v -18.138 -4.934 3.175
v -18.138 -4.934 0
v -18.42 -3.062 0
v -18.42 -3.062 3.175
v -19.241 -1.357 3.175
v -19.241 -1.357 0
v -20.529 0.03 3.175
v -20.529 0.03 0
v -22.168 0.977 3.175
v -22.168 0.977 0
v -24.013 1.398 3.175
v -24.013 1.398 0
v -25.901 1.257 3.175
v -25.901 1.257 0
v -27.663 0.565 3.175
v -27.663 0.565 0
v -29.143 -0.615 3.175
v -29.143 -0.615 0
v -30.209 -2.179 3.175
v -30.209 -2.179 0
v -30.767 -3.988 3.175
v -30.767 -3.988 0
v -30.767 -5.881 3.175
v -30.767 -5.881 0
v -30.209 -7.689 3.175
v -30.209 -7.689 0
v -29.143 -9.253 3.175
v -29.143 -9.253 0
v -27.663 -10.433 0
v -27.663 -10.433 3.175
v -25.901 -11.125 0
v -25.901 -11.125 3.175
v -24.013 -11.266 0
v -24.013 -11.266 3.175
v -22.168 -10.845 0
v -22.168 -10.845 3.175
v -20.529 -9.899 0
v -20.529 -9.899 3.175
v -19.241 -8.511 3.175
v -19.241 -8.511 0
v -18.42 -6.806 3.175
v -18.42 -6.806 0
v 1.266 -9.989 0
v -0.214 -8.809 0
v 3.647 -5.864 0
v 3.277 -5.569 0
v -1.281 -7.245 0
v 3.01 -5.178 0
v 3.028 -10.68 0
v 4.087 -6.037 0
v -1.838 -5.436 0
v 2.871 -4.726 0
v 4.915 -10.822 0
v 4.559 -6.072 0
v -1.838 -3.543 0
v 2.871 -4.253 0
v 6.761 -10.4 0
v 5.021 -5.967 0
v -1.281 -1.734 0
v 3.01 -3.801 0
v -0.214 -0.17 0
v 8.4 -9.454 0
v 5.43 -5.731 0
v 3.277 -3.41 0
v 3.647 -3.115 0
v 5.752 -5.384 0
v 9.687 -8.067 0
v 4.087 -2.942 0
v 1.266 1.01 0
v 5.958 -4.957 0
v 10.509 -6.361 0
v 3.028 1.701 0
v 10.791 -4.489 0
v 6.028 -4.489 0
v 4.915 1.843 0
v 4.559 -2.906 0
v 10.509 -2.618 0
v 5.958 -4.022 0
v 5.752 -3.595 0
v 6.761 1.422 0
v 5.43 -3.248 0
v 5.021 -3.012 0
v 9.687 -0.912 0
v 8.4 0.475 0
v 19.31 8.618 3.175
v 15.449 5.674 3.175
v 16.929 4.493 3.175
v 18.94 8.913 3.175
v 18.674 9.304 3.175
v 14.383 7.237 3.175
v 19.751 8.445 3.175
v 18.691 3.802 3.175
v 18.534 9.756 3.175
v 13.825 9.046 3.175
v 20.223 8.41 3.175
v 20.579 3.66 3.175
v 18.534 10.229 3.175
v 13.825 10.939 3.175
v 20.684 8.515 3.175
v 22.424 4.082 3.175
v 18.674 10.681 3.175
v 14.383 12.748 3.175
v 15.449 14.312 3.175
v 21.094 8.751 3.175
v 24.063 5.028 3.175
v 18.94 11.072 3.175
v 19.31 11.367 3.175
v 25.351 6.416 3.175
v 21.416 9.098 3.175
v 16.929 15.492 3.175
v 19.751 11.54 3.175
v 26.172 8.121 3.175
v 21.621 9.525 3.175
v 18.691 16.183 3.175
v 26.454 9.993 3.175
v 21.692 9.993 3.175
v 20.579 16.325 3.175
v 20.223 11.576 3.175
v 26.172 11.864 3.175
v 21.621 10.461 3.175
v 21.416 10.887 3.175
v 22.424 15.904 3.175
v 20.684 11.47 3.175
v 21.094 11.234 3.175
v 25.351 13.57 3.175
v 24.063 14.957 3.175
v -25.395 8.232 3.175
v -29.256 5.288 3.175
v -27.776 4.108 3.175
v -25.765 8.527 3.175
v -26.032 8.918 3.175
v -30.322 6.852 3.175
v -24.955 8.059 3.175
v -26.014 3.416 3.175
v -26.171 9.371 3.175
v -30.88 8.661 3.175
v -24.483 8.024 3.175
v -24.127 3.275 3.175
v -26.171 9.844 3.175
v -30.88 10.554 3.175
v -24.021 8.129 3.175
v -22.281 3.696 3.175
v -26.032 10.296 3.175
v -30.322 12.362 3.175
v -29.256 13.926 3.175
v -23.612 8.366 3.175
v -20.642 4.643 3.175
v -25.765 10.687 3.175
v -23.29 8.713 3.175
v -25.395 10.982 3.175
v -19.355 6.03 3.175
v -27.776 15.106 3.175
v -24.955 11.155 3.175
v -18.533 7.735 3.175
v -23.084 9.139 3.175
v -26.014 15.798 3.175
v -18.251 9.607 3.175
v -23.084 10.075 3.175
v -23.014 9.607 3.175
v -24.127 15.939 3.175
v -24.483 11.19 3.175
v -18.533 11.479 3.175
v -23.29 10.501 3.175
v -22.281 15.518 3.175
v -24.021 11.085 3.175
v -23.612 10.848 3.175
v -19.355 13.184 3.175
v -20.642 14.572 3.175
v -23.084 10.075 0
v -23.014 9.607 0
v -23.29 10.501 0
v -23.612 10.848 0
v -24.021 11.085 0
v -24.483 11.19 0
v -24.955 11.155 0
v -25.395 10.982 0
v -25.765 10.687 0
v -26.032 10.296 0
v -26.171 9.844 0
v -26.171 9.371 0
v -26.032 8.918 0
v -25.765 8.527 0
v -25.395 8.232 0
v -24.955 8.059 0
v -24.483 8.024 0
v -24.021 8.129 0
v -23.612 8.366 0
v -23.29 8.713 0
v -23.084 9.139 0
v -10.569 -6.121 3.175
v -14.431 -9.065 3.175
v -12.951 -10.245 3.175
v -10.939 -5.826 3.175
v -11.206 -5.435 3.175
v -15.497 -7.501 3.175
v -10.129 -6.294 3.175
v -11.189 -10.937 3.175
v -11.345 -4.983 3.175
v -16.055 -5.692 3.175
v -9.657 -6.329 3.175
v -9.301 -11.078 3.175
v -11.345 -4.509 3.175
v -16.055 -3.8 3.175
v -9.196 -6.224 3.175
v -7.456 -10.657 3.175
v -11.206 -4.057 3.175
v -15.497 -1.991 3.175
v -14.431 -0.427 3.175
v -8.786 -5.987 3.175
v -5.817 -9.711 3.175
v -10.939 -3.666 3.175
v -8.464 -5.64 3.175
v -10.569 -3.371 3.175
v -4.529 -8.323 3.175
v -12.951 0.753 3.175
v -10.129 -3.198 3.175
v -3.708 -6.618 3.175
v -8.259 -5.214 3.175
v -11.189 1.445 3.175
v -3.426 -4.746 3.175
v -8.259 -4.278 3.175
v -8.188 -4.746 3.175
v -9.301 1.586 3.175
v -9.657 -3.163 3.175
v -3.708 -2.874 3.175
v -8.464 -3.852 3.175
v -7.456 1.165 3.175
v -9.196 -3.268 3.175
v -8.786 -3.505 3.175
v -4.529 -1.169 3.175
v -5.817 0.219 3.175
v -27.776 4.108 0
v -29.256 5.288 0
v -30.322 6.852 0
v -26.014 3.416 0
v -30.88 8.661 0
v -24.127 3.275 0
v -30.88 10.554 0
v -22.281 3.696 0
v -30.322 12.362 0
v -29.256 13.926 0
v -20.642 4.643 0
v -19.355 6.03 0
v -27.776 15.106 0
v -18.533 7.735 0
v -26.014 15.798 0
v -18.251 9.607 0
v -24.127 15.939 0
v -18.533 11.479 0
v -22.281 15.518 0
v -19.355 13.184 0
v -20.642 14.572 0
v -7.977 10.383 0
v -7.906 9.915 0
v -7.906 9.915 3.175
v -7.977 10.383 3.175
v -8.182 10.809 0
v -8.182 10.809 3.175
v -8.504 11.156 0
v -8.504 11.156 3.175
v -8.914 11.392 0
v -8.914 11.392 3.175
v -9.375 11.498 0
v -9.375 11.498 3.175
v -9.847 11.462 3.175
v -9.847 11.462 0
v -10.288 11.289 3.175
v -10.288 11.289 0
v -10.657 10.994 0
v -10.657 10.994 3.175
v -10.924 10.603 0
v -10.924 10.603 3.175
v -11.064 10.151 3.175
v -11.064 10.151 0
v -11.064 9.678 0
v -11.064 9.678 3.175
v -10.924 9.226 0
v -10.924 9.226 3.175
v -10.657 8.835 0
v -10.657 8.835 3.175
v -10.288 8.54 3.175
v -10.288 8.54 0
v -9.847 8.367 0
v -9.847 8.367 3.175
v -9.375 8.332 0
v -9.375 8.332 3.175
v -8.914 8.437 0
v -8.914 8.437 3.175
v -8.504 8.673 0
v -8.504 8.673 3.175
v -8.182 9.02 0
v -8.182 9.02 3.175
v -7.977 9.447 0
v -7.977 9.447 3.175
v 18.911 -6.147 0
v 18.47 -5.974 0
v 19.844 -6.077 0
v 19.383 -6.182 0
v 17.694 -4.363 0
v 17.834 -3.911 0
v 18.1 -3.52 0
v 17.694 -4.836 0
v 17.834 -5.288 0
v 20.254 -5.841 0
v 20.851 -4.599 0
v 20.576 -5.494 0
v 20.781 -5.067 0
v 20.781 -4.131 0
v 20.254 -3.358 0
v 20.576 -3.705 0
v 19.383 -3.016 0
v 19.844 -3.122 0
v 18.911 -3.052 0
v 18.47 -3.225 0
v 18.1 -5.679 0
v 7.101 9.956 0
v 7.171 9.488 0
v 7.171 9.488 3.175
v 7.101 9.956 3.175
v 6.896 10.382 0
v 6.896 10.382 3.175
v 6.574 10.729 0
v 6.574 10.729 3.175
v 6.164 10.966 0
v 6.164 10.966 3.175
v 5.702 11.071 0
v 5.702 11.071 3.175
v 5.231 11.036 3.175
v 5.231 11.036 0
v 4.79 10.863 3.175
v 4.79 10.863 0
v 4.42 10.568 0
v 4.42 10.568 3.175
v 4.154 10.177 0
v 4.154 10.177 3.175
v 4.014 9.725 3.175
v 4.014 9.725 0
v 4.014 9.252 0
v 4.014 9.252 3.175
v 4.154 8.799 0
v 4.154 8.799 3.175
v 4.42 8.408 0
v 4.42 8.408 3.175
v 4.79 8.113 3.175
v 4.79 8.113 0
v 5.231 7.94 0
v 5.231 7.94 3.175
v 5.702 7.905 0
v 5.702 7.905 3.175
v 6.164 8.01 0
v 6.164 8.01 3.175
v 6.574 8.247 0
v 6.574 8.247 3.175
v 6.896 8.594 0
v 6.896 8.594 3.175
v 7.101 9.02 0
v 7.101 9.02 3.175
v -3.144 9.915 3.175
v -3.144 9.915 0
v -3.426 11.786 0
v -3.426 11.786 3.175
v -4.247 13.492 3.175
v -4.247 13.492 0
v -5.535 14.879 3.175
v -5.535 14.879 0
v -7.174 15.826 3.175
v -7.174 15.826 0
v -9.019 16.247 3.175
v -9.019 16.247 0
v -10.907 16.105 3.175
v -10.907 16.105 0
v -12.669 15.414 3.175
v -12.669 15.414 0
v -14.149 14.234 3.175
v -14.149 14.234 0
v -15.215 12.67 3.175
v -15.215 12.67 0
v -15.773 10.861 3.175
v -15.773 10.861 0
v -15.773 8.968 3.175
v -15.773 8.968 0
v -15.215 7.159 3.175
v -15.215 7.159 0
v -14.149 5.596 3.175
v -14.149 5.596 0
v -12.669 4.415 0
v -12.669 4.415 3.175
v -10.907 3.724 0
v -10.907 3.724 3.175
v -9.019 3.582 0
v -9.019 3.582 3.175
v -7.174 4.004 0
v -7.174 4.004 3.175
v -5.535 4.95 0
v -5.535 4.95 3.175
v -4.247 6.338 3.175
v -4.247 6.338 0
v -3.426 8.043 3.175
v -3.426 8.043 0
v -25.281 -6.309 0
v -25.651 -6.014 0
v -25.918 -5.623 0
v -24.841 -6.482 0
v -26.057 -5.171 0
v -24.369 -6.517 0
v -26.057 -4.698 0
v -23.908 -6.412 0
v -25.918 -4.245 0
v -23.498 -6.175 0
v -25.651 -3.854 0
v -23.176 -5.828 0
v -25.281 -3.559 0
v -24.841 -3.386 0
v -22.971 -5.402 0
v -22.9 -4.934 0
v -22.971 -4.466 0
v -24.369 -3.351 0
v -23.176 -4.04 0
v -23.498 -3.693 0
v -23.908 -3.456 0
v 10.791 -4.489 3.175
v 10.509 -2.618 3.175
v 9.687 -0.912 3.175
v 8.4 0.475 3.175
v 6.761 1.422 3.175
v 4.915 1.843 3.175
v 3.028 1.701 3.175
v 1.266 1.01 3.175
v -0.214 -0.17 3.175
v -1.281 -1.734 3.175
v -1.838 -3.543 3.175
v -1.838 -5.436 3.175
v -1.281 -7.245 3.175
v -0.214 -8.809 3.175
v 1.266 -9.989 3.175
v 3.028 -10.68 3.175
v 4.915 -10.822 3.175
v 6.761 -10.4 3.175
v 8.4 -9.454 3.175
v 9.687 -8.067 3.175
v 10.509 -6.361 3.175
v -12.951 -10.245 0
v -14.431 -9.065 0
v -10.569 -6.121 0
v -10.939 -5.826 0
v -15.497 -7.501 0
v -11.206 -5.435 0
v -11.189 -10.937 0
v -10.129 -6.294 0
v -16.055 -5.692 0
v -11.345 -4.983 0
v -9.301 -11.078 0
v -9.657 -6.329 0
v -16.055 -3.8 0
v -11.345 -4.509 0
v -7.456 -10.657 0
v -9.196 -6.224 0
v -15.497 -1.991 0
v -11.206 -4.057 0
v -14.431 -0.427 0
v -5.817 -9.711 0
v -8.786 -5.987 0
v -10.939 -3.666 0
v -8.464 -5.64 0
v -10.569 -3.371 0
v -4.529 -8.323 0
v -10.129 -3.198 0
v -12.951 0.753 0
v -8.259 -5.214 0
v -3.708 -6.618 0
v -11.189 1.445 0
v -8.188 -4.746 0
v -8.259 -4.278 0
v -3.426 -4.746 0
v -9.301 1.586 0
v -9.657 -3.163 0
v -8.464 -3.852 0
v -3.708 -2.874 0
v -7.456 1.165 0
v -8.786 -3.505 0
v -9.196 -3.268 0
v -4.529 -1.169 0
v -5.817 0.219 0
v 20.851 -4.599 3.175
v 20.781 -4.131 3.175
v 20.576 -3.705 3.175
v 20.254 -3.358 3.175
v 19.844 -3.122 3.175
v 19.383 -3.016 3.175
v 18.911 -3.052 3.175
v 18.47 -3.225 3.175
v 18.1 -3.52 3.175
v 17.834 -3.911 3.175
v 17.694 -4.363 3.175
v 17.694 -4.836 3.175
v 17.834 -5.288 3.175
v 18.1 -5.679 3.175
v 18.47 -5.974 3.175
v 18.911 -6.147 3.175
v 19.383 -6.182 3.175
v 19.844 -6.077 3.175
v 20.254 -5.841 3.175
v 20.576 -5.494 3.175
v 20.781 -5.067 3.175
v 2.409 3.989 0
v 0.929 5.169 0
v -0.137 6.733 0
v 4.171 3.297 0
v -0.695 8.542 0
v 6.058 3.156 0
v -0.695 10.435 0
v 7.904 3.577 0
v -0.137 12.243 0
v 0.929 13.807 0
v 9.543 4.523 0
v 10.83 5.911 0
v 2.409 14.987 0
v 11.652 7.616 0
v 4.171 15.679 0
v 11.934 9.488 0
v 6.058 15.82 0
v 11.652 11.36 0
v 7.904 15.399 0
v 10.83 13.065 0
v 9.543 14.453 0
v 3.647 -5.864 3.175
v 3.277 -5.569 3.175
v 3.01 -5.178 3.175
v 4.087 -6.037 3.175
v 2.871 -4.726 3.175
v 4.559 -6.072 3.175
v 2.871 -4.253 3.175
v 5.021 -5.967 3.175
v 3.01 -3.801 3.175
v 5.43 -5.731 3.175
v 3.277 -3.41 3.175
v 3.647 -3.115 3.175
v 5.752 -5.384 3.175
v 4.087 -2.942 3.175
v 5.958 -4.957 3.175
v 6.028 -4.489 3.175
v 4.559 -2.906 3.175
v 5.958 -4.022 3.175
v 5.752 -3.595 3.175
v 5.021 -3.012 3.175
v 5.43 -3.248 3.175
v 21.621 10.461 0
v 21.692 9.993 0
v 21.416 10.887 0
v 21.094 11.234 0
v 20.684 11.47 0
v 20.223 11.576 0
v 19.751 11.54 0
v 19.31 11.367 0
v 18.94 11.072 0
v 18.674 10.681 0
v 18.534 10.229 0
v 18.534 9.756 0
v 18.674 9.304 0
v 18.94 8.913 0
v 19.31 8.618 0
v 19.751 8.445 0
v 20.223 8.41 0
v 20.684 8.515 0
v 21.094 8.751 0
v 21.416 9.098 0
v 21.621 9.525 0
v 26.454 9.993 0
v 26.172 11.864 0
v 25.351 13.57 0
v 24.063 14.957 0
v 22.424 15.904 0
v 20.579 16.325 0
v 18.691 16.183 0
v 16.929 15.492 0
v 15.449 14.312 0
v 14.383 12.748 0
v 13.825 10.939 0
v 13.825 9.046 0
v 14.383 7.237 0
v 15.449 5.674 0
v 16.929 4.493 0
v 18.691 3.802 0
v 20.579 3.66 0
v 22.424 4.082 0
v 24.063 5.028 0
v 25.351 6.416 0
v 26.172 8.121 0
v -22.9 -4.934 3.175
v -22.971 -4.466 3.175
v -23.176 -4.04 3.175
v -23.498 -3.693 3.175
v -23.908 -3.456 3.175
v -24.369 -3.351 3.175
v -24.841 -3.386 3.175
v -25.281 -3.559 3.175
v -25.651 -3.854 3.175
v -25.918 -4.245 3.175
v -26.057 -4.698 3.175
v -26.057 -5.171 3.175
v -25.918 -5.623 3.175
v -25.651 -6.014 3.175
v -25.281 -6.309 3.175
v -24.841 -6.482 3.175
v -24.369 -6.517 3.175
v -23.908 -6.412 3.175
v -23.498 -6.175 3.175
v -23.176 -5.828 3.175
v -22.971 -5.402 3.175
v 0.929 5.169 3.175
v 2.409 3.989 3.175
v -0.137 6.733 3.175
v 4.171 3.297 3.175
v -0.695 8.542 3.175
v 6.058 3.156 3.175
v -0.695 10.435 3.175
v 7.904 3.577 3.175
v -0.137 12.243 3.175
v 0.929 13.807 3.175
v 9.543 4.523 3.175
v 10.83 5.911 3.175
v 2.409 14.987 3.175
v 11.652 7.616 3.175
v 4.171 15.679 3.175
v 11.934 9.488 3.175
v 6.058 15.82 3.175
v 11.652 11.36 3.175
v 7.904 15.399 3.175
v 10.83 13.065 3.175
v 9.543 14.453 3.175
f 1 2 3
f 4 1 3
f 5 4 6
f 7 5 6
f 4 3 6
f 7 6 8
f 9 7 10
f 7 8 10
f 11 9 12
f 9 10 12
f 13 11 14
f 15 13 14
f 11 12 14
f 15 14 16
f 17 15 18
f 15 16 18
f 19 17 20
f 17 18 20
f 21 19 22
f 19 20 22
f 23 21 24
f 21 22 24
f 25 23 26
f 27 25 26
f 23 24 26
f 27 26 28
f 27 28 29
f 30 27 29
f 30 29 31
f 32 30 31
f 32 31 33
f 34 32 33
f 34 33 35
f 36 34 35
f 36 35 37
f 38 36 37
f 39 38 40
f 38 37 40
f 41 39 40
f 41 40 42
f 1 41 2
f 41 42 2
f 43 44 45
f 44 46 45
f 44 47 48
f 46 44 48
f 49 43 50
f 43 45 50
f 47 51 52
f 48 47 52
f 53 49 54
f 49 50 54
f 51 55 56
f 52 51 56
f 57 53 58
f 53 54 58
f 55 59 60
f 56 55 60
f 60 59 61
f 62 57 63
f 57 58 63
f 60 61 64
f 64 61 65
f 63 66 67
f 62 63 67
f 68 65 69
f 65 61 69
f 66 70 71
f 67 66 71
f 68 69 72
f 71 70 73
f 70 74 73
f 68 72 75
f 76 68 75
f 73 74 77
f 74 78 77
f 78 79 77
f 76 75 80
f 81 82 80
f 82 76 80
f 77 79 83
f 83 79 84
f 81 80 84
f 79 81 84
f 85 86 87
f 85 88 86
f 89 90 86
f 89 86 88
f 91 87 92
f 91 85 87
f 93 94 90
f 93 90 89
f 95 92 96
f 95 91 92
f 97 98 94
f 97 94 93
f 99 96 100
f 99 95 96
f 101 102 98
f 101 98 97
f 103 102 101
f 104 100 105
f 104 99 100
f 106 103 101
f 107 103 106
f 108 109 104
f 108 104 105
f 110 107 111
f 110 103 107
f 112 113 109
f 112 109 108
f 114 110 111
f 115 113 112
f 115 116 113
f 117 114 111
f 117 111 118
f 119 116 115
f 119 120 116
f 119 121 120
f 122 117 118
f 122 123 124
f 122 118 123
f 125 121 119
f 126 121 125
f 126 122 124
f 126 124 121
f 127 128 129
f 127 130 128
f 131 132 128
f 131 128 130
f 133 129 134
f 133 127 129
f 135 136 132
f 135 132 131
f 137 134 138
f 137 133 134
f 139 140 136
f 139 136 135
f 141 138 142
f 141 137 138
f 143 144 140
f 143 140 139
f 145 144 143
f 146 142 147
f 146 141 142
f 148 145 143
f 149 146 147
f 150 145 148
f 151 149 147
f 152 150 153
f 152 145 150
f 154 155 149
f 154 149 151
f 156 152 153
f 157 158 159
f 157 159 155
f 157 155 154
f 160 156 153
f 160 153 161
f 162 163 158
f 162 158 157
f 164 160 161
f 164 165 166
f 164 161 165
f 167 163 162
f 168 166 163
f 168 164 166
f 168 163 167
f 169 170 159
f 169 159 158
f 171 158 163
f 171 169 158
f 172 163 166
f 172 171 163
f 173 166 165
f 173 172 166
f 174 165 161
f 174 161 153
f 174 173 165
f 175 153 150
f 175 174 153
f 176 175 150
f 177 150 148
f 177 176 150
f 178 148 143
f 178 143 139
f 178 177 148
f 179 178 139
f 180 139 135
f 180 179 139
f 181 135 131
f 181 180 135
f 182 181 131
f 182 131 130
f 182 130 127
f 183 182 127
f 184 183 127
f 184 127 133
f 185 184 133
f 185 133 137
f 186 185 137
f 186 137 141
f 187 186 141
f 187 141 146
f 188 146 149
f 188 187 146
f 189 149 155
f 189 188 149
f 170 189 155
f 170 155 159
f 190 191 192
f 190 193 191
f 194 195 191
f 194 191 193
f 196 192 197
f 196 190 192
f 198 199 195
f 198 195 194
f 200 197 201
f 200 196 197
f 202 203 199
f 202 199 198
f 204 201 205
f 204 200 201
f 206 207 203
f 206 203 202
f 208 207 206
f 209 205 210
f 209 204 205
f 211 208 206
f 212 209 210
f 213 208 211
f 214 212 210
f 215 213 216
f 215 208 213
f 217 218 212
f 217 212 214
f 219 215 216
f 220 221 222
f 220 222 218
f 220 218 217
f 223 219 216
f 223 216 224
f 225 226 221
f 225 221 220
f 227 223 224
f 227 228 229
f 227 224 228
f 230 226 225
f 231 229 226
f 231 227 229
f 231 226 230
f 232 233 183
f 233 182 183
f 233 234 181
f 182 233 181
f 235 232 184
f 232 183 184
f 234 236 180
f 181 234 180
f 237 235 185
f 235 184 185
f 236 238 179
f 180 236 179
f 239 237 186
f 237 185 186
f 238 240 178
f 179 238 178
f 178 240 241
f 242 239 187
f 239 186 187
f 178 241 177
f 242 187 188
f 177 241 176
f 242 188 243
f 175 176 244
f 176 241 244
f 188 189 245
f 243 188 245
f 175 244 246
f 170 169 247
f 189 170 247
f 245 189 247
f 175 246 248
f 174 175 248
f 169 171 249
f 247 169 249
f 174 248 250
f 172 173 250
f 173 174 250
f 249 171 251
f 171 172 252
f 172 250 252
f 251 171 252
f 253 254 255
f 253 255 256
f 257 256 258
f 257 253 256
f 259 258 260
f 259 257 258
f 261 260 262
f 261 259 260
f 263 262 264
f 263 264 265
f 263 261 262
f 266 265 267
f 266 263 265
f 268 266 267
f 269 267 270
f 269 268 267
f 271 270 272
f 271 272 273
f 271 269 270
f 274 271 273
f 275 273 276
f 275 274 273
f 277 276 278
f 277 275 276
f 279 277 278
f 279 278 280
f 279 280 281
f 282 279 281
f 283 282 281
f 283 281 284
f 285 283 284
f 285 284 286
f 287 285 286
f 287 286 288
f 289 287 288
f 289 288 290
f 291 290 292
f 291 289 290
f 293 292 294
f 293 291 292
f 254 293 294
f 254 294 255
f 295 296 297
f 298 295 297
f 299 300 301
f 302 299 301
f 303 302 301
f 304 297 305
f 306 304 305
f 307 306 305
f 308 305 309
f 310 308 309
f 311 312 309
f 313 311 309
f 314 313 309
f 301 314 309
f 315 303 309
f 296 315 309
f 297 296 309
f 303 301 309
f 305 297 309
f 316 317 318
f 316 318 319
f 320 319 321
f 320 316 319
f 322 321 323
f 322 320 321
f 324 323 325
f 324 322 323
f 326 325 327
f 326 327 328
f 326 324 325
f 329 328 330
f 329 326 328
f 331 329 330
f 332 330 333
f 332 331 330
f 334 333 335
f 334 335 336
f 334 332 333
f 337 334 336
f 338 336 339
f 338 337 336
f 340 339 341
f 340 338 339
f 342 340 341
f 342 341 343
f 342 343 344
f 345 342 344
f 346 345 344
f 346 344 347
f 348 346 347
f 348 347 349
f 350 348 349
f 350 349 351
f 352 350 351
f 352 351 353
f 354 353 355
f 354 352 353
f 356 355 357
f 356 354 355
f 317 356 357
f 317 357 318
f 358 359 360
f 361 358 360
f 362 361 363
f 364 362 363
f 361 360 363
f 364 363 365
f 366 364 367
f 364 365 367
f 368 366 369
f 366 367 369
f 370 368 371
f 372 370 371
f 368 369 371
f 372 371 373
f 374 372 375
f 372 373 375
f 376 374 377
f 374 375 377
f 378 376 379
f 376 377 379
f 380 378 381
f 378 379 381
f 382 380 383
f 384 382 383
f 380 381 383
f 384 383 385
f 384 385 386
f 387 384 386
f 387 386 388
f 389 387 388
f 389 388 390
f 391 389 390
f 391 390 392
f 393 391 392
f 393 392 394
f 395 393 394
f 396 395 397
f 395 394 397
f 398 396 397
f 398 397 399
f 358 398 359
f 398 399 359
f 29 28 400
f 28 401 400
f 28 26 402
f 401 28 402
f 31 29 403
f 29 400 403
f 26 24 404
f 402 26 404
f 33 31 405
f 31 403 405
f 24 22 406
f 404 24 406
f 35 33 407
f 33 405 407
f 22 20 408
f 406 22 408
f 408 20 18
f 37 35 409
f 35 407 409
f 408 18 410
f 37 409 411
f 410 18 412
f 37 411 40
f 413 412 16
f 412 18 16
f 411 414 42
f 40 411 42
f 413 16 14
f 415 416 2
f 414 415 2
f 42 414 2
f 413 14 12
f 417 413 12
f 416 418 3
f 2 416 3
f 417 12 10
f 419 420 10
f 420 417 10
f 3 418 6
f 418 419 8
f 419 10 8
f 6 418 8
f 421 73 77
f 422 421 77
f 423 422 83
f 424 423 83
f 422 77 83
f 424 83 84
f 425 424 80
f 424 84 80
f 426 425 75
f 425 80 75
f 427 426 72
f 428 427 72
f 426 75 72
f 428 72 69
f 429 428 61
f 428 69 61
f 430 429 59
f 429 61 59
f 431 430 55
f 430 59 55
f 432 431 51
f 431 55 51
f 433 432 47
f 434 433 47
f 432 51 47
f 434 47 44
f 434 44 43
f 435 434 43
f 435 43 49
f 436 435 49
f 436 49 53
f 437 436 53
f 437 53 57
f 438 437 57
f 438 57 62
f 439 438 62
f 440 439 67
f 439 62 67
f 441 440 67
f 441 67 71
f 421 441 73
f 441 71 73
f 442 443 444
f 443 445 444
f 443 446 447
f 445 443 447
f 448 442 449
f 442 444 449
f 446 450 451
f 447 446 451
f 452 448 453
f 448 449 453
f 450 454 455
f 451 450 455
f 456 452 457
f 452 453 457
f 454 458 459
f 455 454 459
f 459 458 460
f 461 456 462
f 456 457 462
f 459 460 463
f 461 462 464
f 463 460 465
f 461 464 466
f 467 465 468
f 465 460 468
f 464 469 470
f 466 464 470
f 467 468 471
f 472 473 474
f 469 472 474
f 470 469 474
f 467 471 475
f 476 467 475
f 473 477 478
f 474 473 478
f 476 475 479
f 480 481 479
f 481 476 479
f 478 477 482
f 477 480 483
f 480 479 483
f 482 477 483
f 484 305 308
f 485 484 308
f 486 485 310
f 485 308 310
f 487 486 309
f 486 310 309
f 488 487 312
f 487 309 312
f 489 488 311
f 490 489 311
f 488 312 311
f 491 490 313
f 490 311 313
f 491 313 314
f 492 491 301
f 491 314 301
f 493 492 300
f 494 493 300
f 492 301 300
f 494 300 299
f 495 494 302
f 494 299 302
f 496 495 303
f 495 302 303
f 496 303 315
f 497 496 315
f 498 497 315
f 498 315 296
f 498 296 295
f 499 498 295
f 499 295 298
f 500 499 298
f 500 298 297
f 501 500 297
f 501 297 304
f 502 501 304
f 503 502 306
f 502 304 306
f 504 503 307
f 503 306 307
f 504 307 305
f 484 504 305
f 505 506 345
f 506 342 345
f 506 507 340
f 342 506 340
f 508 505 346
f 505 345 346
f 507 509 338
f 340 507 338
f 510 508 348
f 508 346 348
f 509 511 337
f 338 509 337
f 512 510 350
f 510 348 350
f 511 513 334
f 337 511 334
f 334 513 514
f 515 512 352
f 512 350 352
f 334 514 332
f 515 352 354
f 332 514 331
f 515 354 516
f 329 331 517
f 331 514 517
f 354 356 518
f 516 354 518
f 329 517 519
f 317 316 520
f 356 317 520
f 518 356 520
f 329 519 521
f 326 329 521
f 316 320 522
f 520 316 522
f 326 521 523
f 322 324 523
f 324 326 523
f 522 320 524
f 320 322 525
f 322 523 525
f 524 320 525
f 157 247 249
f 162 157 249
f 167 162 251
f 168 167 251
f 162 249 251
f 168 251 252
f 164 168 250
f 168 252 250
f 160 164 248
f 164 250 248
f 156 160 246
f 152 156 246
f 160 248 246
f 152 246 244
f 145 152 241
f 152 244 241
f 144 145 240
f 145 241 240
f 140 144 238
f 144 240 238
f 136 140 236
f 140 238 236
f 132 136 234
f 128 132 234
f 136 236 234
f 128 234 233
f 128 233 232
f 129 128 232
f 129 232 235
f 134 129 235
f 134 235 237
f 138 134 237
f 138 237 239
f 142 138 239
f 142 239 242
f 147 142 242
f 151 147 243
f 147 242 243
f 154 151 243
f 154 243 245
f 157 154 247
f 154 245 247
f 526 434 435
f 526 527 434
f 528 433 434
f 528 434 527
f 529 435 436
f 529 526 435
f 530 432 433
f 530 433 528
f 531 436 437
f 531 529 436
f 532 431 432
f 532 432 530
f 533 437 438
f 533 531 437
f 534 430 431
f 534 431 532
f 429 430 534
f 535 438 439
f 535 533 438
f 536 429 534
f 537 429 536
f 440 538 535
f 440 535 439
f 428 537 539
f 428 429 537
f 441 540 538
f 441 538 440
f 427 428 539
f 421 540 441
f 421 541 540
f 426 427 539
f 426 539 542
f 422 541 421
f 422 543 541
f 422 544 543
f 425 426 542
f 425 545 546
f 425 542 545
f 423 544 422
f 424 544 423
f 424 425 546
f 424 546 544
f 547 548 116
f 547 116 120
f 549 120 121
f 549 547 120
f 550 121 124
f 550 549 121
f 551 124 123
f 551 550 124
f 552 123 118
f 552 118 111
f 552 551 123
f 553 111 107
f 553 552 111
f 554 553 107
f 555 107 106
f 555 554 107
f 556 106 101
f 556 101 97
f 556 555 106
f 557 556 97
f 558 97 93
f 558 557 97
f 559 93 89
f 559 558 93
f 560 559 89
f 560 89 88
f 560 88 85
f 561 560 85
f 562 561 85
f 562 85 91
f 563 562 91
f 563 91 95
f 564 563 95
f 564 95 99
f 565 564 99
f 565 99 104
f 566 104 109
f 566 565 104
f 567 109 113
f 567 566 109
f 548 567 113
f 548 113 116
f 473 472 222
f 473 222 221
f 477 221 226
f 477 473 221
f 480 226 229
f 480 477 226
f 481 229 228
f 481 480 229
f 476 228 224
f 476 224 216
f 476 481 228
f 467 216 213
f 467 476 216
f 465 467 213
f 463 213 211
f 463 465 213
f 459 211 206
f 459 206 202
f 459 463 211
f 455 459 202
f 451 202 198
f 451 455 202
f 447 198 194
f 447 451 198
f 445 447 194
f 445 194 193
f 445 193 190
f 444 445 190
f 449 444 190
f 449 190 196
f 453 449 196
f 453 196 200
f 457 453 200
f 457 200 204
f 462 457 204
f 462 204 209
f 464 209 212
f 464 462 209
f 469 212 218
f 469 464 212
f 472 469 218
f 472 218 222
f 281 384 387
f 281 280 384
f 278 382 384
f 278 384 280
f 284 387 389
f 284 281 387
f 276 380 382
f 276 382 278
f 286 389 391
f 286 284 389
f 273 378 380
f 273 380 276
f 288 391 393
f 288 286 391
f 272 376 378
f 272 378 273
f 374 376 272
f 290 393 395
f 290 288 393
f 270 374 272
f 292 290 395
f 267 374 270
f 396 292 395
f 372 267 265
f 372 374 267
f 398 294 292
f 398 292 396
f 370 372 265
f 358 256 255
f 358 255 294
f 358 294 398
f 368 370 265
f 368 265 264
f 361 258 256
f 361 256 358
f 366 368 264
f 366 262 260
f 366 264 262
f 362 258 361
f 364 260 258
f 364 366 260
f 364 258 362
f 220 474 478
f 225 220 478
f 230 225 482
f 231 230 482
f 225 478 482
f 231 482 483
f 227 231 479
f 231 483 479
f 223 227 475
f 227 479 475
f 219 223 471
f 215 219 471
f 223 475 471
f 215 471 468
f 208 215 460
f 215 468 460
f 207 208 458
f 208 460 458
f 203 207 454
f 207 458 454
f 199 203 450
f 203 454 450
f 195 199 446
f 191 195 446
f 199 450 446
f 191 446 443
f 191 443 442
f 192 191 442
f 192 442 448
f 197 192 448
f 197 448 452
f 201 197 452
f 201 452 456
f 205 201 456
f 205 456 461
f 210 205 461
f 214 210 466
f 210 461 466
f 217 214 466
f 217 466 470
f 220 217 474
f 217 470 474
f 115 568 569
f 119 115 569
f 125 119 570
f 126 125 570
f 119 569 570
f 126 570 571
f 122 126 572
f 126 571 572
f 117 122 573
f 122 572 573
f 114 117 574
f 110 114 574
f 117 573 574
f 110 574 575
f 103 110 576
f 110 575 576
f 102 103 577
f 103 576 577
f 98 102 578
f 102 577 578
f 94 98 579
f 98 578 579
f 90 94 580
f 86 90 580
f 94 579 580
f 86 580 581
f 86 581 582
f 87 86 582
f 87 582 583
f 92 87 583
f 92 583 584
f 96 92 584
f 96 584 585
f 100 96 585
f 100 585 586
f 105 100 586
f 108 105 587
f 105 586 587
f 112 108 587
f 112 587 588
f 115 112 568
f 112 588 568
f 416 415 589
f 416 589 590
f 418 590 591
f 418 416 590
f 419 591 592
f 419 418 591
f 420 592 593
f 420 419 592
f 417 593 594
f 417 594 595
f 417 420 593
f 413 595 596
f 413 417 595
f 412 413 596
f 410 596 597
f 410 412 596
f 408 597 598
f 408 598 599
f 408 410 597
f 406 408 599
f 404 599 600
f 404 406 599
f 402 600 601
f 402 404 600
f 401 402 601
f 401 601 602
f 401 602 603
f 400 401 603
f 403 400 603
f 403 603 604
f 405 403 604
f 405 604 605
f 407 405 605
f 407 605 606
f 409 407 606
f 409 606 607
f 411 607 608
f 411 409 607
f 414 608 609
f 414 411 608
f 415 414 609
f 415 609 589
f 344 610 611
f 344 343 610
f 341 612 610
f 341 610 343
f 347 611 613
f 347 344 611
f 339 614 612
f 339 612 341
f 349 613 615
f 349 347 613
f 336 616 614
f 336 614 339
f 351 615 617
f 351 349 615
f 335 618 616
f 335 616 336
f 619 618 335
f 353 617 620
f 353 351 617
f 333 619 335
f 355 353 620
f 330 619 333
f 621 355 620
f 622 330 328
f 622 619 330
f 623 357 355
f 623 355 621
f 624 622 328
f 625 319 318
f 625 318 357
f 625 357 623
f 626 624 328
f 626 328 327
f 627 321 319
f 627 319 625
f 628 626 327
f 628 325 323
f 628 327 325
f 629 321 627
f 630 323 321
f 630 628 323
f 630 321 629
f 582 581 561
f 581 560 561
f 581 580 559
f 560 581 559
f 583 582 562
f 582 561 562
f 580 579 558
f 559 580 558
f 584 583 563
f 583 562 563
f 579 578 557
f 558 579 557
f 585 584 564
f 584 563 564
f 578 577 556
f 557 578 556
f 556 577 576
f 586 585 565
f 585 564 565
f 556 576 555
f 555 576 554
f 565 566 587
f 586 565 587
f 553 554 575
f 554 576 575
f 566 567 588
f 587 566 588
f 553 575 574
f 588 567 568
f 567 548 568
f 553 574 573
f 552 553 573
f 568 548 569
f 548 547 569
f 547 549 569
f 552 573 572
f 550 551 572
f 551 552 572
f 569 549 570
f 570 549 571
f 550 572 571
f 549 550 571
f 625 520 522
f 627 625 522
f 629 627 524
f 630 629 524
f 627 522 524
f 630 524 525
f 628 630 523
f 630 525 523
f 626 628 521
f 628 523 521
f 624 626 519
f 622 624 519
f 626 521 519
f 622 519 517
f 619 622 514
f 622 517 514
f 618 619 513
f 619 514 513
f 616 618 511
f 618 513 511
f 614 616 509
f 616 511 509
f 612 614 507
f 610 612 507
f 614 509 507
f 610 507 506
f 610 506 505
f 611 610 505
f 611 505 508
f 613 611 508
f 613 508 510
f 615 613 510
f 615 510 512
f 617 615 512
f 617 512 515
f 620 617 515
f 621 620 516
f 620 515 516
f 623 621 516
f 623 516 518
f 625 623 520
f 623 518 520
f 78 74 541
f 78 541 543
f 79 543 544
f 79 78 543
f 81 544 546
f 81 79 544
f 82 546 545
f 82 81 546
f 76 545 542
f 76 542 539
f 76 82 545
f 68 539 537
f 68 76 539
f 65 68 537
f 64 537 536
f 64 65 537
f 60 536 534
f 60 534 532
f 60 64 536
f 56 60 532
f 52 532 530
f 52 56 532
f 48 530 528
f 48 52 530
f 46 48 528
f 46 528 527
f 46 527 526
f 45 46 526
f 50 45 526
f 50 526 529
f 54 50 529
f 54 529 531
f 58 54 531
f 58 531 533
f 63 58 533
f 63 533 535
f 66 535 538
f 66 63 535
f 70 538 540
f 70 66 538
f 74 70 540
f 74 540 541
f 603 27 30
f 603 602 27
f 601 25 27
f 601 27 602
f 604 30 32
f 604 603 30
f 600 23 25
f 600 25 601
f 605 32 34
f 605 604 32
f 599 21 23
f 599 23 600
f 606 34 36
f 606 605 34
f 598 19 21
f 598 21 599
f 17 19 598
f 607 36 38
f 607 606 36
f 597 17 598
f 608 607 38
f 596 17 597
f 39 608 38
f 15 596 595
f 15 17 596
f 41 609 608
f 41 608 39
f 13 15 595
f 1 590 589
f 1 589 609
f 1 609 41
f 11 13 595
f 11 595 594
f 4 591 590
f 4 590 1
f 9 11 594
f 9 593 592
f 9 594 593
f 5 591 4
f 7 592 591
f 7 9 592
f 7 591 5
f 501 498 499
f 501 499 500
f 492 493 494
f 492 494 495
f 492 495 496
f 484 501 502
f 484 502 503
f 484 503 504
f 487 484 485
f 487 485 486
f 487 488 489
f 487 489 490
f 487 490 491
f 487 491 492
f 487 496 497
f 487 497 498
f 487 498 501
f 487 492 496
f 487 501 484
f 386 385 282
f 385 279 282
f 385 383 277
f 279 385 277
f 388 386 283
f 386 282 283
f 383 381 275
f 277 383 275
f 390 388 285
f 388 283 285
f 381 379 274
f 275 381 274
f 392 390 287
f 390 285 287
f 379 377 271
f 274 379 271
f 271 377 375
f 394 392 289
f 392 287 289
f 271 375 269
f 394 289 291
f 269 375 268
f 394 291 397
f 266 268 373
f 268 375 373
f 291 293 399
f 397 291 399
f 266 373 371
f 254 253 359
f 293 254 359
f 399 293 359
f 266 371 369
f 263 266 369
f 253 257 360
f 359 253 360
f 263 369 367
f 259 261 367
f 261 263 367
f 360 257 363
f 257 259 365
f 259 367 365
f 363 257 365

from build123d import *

# Parameters (mm, degrees)
F0_R     = 6.35
F0_R_2   = 1.5875
F1_DEPTH = 3.175


with BuildPart() as f1:
    # F0 (on Top) → F1 (new body)
    with BuildSketch(Plane.XY):
        with Locations((-24.601303, 9.60713)):
            Circle(F0_R)
        with Locations((-24.601303, 9.60713)):
            Circle(F0_R_2, mode=Mode.SUBTRACT)
        with Locations((-9.49377, 9.914634)):
            Circle(F0_R)
        with Locations((-9.49377, 9.914634)):
            Circle(F0_R_2, mode=Mode.SUBTRACT)
        with Locations((5.583865, 9.488119)):
            Circle(F0_R)
        with Locations((5.583865, 9.488119)):
            Circle(F0_R_2, mode=Mode.SUBTRACT)
        with Locations((20.104176, 9.992605)):
            Circle(F0_R)
        with Locations((20.104176, 9.992605)):
            Circle(F0_R_2, mode=Mode.SUBTRACT)
        with Locations((-24.487723, -4.934167)):
            Circle(F0_R)
        with Locations((-24.487723, -4.934167)):
            Circle(F0_R_2, mode=Mode.SUBTRACT)
        with Locations((4.440631, -4.489426)):
            Circle(F0_R)
        with Locations((4.440631, -4.489426)):
            Circle(F0_R_2, mode=Mode.SUBTRACT)
        with Locations((-9.775711, -4.746053)):
            Circle(F0_R)
        with Locations((-9.775711, -4.746053)):
            Circle(F0_R_2, mode=Mode.SUBTRACT)
        with Locations((19.263954, -4.599343)):
            Circle(F0_R_2)
    extrude(amount=F1_DEPTH)


solid = f1.part
